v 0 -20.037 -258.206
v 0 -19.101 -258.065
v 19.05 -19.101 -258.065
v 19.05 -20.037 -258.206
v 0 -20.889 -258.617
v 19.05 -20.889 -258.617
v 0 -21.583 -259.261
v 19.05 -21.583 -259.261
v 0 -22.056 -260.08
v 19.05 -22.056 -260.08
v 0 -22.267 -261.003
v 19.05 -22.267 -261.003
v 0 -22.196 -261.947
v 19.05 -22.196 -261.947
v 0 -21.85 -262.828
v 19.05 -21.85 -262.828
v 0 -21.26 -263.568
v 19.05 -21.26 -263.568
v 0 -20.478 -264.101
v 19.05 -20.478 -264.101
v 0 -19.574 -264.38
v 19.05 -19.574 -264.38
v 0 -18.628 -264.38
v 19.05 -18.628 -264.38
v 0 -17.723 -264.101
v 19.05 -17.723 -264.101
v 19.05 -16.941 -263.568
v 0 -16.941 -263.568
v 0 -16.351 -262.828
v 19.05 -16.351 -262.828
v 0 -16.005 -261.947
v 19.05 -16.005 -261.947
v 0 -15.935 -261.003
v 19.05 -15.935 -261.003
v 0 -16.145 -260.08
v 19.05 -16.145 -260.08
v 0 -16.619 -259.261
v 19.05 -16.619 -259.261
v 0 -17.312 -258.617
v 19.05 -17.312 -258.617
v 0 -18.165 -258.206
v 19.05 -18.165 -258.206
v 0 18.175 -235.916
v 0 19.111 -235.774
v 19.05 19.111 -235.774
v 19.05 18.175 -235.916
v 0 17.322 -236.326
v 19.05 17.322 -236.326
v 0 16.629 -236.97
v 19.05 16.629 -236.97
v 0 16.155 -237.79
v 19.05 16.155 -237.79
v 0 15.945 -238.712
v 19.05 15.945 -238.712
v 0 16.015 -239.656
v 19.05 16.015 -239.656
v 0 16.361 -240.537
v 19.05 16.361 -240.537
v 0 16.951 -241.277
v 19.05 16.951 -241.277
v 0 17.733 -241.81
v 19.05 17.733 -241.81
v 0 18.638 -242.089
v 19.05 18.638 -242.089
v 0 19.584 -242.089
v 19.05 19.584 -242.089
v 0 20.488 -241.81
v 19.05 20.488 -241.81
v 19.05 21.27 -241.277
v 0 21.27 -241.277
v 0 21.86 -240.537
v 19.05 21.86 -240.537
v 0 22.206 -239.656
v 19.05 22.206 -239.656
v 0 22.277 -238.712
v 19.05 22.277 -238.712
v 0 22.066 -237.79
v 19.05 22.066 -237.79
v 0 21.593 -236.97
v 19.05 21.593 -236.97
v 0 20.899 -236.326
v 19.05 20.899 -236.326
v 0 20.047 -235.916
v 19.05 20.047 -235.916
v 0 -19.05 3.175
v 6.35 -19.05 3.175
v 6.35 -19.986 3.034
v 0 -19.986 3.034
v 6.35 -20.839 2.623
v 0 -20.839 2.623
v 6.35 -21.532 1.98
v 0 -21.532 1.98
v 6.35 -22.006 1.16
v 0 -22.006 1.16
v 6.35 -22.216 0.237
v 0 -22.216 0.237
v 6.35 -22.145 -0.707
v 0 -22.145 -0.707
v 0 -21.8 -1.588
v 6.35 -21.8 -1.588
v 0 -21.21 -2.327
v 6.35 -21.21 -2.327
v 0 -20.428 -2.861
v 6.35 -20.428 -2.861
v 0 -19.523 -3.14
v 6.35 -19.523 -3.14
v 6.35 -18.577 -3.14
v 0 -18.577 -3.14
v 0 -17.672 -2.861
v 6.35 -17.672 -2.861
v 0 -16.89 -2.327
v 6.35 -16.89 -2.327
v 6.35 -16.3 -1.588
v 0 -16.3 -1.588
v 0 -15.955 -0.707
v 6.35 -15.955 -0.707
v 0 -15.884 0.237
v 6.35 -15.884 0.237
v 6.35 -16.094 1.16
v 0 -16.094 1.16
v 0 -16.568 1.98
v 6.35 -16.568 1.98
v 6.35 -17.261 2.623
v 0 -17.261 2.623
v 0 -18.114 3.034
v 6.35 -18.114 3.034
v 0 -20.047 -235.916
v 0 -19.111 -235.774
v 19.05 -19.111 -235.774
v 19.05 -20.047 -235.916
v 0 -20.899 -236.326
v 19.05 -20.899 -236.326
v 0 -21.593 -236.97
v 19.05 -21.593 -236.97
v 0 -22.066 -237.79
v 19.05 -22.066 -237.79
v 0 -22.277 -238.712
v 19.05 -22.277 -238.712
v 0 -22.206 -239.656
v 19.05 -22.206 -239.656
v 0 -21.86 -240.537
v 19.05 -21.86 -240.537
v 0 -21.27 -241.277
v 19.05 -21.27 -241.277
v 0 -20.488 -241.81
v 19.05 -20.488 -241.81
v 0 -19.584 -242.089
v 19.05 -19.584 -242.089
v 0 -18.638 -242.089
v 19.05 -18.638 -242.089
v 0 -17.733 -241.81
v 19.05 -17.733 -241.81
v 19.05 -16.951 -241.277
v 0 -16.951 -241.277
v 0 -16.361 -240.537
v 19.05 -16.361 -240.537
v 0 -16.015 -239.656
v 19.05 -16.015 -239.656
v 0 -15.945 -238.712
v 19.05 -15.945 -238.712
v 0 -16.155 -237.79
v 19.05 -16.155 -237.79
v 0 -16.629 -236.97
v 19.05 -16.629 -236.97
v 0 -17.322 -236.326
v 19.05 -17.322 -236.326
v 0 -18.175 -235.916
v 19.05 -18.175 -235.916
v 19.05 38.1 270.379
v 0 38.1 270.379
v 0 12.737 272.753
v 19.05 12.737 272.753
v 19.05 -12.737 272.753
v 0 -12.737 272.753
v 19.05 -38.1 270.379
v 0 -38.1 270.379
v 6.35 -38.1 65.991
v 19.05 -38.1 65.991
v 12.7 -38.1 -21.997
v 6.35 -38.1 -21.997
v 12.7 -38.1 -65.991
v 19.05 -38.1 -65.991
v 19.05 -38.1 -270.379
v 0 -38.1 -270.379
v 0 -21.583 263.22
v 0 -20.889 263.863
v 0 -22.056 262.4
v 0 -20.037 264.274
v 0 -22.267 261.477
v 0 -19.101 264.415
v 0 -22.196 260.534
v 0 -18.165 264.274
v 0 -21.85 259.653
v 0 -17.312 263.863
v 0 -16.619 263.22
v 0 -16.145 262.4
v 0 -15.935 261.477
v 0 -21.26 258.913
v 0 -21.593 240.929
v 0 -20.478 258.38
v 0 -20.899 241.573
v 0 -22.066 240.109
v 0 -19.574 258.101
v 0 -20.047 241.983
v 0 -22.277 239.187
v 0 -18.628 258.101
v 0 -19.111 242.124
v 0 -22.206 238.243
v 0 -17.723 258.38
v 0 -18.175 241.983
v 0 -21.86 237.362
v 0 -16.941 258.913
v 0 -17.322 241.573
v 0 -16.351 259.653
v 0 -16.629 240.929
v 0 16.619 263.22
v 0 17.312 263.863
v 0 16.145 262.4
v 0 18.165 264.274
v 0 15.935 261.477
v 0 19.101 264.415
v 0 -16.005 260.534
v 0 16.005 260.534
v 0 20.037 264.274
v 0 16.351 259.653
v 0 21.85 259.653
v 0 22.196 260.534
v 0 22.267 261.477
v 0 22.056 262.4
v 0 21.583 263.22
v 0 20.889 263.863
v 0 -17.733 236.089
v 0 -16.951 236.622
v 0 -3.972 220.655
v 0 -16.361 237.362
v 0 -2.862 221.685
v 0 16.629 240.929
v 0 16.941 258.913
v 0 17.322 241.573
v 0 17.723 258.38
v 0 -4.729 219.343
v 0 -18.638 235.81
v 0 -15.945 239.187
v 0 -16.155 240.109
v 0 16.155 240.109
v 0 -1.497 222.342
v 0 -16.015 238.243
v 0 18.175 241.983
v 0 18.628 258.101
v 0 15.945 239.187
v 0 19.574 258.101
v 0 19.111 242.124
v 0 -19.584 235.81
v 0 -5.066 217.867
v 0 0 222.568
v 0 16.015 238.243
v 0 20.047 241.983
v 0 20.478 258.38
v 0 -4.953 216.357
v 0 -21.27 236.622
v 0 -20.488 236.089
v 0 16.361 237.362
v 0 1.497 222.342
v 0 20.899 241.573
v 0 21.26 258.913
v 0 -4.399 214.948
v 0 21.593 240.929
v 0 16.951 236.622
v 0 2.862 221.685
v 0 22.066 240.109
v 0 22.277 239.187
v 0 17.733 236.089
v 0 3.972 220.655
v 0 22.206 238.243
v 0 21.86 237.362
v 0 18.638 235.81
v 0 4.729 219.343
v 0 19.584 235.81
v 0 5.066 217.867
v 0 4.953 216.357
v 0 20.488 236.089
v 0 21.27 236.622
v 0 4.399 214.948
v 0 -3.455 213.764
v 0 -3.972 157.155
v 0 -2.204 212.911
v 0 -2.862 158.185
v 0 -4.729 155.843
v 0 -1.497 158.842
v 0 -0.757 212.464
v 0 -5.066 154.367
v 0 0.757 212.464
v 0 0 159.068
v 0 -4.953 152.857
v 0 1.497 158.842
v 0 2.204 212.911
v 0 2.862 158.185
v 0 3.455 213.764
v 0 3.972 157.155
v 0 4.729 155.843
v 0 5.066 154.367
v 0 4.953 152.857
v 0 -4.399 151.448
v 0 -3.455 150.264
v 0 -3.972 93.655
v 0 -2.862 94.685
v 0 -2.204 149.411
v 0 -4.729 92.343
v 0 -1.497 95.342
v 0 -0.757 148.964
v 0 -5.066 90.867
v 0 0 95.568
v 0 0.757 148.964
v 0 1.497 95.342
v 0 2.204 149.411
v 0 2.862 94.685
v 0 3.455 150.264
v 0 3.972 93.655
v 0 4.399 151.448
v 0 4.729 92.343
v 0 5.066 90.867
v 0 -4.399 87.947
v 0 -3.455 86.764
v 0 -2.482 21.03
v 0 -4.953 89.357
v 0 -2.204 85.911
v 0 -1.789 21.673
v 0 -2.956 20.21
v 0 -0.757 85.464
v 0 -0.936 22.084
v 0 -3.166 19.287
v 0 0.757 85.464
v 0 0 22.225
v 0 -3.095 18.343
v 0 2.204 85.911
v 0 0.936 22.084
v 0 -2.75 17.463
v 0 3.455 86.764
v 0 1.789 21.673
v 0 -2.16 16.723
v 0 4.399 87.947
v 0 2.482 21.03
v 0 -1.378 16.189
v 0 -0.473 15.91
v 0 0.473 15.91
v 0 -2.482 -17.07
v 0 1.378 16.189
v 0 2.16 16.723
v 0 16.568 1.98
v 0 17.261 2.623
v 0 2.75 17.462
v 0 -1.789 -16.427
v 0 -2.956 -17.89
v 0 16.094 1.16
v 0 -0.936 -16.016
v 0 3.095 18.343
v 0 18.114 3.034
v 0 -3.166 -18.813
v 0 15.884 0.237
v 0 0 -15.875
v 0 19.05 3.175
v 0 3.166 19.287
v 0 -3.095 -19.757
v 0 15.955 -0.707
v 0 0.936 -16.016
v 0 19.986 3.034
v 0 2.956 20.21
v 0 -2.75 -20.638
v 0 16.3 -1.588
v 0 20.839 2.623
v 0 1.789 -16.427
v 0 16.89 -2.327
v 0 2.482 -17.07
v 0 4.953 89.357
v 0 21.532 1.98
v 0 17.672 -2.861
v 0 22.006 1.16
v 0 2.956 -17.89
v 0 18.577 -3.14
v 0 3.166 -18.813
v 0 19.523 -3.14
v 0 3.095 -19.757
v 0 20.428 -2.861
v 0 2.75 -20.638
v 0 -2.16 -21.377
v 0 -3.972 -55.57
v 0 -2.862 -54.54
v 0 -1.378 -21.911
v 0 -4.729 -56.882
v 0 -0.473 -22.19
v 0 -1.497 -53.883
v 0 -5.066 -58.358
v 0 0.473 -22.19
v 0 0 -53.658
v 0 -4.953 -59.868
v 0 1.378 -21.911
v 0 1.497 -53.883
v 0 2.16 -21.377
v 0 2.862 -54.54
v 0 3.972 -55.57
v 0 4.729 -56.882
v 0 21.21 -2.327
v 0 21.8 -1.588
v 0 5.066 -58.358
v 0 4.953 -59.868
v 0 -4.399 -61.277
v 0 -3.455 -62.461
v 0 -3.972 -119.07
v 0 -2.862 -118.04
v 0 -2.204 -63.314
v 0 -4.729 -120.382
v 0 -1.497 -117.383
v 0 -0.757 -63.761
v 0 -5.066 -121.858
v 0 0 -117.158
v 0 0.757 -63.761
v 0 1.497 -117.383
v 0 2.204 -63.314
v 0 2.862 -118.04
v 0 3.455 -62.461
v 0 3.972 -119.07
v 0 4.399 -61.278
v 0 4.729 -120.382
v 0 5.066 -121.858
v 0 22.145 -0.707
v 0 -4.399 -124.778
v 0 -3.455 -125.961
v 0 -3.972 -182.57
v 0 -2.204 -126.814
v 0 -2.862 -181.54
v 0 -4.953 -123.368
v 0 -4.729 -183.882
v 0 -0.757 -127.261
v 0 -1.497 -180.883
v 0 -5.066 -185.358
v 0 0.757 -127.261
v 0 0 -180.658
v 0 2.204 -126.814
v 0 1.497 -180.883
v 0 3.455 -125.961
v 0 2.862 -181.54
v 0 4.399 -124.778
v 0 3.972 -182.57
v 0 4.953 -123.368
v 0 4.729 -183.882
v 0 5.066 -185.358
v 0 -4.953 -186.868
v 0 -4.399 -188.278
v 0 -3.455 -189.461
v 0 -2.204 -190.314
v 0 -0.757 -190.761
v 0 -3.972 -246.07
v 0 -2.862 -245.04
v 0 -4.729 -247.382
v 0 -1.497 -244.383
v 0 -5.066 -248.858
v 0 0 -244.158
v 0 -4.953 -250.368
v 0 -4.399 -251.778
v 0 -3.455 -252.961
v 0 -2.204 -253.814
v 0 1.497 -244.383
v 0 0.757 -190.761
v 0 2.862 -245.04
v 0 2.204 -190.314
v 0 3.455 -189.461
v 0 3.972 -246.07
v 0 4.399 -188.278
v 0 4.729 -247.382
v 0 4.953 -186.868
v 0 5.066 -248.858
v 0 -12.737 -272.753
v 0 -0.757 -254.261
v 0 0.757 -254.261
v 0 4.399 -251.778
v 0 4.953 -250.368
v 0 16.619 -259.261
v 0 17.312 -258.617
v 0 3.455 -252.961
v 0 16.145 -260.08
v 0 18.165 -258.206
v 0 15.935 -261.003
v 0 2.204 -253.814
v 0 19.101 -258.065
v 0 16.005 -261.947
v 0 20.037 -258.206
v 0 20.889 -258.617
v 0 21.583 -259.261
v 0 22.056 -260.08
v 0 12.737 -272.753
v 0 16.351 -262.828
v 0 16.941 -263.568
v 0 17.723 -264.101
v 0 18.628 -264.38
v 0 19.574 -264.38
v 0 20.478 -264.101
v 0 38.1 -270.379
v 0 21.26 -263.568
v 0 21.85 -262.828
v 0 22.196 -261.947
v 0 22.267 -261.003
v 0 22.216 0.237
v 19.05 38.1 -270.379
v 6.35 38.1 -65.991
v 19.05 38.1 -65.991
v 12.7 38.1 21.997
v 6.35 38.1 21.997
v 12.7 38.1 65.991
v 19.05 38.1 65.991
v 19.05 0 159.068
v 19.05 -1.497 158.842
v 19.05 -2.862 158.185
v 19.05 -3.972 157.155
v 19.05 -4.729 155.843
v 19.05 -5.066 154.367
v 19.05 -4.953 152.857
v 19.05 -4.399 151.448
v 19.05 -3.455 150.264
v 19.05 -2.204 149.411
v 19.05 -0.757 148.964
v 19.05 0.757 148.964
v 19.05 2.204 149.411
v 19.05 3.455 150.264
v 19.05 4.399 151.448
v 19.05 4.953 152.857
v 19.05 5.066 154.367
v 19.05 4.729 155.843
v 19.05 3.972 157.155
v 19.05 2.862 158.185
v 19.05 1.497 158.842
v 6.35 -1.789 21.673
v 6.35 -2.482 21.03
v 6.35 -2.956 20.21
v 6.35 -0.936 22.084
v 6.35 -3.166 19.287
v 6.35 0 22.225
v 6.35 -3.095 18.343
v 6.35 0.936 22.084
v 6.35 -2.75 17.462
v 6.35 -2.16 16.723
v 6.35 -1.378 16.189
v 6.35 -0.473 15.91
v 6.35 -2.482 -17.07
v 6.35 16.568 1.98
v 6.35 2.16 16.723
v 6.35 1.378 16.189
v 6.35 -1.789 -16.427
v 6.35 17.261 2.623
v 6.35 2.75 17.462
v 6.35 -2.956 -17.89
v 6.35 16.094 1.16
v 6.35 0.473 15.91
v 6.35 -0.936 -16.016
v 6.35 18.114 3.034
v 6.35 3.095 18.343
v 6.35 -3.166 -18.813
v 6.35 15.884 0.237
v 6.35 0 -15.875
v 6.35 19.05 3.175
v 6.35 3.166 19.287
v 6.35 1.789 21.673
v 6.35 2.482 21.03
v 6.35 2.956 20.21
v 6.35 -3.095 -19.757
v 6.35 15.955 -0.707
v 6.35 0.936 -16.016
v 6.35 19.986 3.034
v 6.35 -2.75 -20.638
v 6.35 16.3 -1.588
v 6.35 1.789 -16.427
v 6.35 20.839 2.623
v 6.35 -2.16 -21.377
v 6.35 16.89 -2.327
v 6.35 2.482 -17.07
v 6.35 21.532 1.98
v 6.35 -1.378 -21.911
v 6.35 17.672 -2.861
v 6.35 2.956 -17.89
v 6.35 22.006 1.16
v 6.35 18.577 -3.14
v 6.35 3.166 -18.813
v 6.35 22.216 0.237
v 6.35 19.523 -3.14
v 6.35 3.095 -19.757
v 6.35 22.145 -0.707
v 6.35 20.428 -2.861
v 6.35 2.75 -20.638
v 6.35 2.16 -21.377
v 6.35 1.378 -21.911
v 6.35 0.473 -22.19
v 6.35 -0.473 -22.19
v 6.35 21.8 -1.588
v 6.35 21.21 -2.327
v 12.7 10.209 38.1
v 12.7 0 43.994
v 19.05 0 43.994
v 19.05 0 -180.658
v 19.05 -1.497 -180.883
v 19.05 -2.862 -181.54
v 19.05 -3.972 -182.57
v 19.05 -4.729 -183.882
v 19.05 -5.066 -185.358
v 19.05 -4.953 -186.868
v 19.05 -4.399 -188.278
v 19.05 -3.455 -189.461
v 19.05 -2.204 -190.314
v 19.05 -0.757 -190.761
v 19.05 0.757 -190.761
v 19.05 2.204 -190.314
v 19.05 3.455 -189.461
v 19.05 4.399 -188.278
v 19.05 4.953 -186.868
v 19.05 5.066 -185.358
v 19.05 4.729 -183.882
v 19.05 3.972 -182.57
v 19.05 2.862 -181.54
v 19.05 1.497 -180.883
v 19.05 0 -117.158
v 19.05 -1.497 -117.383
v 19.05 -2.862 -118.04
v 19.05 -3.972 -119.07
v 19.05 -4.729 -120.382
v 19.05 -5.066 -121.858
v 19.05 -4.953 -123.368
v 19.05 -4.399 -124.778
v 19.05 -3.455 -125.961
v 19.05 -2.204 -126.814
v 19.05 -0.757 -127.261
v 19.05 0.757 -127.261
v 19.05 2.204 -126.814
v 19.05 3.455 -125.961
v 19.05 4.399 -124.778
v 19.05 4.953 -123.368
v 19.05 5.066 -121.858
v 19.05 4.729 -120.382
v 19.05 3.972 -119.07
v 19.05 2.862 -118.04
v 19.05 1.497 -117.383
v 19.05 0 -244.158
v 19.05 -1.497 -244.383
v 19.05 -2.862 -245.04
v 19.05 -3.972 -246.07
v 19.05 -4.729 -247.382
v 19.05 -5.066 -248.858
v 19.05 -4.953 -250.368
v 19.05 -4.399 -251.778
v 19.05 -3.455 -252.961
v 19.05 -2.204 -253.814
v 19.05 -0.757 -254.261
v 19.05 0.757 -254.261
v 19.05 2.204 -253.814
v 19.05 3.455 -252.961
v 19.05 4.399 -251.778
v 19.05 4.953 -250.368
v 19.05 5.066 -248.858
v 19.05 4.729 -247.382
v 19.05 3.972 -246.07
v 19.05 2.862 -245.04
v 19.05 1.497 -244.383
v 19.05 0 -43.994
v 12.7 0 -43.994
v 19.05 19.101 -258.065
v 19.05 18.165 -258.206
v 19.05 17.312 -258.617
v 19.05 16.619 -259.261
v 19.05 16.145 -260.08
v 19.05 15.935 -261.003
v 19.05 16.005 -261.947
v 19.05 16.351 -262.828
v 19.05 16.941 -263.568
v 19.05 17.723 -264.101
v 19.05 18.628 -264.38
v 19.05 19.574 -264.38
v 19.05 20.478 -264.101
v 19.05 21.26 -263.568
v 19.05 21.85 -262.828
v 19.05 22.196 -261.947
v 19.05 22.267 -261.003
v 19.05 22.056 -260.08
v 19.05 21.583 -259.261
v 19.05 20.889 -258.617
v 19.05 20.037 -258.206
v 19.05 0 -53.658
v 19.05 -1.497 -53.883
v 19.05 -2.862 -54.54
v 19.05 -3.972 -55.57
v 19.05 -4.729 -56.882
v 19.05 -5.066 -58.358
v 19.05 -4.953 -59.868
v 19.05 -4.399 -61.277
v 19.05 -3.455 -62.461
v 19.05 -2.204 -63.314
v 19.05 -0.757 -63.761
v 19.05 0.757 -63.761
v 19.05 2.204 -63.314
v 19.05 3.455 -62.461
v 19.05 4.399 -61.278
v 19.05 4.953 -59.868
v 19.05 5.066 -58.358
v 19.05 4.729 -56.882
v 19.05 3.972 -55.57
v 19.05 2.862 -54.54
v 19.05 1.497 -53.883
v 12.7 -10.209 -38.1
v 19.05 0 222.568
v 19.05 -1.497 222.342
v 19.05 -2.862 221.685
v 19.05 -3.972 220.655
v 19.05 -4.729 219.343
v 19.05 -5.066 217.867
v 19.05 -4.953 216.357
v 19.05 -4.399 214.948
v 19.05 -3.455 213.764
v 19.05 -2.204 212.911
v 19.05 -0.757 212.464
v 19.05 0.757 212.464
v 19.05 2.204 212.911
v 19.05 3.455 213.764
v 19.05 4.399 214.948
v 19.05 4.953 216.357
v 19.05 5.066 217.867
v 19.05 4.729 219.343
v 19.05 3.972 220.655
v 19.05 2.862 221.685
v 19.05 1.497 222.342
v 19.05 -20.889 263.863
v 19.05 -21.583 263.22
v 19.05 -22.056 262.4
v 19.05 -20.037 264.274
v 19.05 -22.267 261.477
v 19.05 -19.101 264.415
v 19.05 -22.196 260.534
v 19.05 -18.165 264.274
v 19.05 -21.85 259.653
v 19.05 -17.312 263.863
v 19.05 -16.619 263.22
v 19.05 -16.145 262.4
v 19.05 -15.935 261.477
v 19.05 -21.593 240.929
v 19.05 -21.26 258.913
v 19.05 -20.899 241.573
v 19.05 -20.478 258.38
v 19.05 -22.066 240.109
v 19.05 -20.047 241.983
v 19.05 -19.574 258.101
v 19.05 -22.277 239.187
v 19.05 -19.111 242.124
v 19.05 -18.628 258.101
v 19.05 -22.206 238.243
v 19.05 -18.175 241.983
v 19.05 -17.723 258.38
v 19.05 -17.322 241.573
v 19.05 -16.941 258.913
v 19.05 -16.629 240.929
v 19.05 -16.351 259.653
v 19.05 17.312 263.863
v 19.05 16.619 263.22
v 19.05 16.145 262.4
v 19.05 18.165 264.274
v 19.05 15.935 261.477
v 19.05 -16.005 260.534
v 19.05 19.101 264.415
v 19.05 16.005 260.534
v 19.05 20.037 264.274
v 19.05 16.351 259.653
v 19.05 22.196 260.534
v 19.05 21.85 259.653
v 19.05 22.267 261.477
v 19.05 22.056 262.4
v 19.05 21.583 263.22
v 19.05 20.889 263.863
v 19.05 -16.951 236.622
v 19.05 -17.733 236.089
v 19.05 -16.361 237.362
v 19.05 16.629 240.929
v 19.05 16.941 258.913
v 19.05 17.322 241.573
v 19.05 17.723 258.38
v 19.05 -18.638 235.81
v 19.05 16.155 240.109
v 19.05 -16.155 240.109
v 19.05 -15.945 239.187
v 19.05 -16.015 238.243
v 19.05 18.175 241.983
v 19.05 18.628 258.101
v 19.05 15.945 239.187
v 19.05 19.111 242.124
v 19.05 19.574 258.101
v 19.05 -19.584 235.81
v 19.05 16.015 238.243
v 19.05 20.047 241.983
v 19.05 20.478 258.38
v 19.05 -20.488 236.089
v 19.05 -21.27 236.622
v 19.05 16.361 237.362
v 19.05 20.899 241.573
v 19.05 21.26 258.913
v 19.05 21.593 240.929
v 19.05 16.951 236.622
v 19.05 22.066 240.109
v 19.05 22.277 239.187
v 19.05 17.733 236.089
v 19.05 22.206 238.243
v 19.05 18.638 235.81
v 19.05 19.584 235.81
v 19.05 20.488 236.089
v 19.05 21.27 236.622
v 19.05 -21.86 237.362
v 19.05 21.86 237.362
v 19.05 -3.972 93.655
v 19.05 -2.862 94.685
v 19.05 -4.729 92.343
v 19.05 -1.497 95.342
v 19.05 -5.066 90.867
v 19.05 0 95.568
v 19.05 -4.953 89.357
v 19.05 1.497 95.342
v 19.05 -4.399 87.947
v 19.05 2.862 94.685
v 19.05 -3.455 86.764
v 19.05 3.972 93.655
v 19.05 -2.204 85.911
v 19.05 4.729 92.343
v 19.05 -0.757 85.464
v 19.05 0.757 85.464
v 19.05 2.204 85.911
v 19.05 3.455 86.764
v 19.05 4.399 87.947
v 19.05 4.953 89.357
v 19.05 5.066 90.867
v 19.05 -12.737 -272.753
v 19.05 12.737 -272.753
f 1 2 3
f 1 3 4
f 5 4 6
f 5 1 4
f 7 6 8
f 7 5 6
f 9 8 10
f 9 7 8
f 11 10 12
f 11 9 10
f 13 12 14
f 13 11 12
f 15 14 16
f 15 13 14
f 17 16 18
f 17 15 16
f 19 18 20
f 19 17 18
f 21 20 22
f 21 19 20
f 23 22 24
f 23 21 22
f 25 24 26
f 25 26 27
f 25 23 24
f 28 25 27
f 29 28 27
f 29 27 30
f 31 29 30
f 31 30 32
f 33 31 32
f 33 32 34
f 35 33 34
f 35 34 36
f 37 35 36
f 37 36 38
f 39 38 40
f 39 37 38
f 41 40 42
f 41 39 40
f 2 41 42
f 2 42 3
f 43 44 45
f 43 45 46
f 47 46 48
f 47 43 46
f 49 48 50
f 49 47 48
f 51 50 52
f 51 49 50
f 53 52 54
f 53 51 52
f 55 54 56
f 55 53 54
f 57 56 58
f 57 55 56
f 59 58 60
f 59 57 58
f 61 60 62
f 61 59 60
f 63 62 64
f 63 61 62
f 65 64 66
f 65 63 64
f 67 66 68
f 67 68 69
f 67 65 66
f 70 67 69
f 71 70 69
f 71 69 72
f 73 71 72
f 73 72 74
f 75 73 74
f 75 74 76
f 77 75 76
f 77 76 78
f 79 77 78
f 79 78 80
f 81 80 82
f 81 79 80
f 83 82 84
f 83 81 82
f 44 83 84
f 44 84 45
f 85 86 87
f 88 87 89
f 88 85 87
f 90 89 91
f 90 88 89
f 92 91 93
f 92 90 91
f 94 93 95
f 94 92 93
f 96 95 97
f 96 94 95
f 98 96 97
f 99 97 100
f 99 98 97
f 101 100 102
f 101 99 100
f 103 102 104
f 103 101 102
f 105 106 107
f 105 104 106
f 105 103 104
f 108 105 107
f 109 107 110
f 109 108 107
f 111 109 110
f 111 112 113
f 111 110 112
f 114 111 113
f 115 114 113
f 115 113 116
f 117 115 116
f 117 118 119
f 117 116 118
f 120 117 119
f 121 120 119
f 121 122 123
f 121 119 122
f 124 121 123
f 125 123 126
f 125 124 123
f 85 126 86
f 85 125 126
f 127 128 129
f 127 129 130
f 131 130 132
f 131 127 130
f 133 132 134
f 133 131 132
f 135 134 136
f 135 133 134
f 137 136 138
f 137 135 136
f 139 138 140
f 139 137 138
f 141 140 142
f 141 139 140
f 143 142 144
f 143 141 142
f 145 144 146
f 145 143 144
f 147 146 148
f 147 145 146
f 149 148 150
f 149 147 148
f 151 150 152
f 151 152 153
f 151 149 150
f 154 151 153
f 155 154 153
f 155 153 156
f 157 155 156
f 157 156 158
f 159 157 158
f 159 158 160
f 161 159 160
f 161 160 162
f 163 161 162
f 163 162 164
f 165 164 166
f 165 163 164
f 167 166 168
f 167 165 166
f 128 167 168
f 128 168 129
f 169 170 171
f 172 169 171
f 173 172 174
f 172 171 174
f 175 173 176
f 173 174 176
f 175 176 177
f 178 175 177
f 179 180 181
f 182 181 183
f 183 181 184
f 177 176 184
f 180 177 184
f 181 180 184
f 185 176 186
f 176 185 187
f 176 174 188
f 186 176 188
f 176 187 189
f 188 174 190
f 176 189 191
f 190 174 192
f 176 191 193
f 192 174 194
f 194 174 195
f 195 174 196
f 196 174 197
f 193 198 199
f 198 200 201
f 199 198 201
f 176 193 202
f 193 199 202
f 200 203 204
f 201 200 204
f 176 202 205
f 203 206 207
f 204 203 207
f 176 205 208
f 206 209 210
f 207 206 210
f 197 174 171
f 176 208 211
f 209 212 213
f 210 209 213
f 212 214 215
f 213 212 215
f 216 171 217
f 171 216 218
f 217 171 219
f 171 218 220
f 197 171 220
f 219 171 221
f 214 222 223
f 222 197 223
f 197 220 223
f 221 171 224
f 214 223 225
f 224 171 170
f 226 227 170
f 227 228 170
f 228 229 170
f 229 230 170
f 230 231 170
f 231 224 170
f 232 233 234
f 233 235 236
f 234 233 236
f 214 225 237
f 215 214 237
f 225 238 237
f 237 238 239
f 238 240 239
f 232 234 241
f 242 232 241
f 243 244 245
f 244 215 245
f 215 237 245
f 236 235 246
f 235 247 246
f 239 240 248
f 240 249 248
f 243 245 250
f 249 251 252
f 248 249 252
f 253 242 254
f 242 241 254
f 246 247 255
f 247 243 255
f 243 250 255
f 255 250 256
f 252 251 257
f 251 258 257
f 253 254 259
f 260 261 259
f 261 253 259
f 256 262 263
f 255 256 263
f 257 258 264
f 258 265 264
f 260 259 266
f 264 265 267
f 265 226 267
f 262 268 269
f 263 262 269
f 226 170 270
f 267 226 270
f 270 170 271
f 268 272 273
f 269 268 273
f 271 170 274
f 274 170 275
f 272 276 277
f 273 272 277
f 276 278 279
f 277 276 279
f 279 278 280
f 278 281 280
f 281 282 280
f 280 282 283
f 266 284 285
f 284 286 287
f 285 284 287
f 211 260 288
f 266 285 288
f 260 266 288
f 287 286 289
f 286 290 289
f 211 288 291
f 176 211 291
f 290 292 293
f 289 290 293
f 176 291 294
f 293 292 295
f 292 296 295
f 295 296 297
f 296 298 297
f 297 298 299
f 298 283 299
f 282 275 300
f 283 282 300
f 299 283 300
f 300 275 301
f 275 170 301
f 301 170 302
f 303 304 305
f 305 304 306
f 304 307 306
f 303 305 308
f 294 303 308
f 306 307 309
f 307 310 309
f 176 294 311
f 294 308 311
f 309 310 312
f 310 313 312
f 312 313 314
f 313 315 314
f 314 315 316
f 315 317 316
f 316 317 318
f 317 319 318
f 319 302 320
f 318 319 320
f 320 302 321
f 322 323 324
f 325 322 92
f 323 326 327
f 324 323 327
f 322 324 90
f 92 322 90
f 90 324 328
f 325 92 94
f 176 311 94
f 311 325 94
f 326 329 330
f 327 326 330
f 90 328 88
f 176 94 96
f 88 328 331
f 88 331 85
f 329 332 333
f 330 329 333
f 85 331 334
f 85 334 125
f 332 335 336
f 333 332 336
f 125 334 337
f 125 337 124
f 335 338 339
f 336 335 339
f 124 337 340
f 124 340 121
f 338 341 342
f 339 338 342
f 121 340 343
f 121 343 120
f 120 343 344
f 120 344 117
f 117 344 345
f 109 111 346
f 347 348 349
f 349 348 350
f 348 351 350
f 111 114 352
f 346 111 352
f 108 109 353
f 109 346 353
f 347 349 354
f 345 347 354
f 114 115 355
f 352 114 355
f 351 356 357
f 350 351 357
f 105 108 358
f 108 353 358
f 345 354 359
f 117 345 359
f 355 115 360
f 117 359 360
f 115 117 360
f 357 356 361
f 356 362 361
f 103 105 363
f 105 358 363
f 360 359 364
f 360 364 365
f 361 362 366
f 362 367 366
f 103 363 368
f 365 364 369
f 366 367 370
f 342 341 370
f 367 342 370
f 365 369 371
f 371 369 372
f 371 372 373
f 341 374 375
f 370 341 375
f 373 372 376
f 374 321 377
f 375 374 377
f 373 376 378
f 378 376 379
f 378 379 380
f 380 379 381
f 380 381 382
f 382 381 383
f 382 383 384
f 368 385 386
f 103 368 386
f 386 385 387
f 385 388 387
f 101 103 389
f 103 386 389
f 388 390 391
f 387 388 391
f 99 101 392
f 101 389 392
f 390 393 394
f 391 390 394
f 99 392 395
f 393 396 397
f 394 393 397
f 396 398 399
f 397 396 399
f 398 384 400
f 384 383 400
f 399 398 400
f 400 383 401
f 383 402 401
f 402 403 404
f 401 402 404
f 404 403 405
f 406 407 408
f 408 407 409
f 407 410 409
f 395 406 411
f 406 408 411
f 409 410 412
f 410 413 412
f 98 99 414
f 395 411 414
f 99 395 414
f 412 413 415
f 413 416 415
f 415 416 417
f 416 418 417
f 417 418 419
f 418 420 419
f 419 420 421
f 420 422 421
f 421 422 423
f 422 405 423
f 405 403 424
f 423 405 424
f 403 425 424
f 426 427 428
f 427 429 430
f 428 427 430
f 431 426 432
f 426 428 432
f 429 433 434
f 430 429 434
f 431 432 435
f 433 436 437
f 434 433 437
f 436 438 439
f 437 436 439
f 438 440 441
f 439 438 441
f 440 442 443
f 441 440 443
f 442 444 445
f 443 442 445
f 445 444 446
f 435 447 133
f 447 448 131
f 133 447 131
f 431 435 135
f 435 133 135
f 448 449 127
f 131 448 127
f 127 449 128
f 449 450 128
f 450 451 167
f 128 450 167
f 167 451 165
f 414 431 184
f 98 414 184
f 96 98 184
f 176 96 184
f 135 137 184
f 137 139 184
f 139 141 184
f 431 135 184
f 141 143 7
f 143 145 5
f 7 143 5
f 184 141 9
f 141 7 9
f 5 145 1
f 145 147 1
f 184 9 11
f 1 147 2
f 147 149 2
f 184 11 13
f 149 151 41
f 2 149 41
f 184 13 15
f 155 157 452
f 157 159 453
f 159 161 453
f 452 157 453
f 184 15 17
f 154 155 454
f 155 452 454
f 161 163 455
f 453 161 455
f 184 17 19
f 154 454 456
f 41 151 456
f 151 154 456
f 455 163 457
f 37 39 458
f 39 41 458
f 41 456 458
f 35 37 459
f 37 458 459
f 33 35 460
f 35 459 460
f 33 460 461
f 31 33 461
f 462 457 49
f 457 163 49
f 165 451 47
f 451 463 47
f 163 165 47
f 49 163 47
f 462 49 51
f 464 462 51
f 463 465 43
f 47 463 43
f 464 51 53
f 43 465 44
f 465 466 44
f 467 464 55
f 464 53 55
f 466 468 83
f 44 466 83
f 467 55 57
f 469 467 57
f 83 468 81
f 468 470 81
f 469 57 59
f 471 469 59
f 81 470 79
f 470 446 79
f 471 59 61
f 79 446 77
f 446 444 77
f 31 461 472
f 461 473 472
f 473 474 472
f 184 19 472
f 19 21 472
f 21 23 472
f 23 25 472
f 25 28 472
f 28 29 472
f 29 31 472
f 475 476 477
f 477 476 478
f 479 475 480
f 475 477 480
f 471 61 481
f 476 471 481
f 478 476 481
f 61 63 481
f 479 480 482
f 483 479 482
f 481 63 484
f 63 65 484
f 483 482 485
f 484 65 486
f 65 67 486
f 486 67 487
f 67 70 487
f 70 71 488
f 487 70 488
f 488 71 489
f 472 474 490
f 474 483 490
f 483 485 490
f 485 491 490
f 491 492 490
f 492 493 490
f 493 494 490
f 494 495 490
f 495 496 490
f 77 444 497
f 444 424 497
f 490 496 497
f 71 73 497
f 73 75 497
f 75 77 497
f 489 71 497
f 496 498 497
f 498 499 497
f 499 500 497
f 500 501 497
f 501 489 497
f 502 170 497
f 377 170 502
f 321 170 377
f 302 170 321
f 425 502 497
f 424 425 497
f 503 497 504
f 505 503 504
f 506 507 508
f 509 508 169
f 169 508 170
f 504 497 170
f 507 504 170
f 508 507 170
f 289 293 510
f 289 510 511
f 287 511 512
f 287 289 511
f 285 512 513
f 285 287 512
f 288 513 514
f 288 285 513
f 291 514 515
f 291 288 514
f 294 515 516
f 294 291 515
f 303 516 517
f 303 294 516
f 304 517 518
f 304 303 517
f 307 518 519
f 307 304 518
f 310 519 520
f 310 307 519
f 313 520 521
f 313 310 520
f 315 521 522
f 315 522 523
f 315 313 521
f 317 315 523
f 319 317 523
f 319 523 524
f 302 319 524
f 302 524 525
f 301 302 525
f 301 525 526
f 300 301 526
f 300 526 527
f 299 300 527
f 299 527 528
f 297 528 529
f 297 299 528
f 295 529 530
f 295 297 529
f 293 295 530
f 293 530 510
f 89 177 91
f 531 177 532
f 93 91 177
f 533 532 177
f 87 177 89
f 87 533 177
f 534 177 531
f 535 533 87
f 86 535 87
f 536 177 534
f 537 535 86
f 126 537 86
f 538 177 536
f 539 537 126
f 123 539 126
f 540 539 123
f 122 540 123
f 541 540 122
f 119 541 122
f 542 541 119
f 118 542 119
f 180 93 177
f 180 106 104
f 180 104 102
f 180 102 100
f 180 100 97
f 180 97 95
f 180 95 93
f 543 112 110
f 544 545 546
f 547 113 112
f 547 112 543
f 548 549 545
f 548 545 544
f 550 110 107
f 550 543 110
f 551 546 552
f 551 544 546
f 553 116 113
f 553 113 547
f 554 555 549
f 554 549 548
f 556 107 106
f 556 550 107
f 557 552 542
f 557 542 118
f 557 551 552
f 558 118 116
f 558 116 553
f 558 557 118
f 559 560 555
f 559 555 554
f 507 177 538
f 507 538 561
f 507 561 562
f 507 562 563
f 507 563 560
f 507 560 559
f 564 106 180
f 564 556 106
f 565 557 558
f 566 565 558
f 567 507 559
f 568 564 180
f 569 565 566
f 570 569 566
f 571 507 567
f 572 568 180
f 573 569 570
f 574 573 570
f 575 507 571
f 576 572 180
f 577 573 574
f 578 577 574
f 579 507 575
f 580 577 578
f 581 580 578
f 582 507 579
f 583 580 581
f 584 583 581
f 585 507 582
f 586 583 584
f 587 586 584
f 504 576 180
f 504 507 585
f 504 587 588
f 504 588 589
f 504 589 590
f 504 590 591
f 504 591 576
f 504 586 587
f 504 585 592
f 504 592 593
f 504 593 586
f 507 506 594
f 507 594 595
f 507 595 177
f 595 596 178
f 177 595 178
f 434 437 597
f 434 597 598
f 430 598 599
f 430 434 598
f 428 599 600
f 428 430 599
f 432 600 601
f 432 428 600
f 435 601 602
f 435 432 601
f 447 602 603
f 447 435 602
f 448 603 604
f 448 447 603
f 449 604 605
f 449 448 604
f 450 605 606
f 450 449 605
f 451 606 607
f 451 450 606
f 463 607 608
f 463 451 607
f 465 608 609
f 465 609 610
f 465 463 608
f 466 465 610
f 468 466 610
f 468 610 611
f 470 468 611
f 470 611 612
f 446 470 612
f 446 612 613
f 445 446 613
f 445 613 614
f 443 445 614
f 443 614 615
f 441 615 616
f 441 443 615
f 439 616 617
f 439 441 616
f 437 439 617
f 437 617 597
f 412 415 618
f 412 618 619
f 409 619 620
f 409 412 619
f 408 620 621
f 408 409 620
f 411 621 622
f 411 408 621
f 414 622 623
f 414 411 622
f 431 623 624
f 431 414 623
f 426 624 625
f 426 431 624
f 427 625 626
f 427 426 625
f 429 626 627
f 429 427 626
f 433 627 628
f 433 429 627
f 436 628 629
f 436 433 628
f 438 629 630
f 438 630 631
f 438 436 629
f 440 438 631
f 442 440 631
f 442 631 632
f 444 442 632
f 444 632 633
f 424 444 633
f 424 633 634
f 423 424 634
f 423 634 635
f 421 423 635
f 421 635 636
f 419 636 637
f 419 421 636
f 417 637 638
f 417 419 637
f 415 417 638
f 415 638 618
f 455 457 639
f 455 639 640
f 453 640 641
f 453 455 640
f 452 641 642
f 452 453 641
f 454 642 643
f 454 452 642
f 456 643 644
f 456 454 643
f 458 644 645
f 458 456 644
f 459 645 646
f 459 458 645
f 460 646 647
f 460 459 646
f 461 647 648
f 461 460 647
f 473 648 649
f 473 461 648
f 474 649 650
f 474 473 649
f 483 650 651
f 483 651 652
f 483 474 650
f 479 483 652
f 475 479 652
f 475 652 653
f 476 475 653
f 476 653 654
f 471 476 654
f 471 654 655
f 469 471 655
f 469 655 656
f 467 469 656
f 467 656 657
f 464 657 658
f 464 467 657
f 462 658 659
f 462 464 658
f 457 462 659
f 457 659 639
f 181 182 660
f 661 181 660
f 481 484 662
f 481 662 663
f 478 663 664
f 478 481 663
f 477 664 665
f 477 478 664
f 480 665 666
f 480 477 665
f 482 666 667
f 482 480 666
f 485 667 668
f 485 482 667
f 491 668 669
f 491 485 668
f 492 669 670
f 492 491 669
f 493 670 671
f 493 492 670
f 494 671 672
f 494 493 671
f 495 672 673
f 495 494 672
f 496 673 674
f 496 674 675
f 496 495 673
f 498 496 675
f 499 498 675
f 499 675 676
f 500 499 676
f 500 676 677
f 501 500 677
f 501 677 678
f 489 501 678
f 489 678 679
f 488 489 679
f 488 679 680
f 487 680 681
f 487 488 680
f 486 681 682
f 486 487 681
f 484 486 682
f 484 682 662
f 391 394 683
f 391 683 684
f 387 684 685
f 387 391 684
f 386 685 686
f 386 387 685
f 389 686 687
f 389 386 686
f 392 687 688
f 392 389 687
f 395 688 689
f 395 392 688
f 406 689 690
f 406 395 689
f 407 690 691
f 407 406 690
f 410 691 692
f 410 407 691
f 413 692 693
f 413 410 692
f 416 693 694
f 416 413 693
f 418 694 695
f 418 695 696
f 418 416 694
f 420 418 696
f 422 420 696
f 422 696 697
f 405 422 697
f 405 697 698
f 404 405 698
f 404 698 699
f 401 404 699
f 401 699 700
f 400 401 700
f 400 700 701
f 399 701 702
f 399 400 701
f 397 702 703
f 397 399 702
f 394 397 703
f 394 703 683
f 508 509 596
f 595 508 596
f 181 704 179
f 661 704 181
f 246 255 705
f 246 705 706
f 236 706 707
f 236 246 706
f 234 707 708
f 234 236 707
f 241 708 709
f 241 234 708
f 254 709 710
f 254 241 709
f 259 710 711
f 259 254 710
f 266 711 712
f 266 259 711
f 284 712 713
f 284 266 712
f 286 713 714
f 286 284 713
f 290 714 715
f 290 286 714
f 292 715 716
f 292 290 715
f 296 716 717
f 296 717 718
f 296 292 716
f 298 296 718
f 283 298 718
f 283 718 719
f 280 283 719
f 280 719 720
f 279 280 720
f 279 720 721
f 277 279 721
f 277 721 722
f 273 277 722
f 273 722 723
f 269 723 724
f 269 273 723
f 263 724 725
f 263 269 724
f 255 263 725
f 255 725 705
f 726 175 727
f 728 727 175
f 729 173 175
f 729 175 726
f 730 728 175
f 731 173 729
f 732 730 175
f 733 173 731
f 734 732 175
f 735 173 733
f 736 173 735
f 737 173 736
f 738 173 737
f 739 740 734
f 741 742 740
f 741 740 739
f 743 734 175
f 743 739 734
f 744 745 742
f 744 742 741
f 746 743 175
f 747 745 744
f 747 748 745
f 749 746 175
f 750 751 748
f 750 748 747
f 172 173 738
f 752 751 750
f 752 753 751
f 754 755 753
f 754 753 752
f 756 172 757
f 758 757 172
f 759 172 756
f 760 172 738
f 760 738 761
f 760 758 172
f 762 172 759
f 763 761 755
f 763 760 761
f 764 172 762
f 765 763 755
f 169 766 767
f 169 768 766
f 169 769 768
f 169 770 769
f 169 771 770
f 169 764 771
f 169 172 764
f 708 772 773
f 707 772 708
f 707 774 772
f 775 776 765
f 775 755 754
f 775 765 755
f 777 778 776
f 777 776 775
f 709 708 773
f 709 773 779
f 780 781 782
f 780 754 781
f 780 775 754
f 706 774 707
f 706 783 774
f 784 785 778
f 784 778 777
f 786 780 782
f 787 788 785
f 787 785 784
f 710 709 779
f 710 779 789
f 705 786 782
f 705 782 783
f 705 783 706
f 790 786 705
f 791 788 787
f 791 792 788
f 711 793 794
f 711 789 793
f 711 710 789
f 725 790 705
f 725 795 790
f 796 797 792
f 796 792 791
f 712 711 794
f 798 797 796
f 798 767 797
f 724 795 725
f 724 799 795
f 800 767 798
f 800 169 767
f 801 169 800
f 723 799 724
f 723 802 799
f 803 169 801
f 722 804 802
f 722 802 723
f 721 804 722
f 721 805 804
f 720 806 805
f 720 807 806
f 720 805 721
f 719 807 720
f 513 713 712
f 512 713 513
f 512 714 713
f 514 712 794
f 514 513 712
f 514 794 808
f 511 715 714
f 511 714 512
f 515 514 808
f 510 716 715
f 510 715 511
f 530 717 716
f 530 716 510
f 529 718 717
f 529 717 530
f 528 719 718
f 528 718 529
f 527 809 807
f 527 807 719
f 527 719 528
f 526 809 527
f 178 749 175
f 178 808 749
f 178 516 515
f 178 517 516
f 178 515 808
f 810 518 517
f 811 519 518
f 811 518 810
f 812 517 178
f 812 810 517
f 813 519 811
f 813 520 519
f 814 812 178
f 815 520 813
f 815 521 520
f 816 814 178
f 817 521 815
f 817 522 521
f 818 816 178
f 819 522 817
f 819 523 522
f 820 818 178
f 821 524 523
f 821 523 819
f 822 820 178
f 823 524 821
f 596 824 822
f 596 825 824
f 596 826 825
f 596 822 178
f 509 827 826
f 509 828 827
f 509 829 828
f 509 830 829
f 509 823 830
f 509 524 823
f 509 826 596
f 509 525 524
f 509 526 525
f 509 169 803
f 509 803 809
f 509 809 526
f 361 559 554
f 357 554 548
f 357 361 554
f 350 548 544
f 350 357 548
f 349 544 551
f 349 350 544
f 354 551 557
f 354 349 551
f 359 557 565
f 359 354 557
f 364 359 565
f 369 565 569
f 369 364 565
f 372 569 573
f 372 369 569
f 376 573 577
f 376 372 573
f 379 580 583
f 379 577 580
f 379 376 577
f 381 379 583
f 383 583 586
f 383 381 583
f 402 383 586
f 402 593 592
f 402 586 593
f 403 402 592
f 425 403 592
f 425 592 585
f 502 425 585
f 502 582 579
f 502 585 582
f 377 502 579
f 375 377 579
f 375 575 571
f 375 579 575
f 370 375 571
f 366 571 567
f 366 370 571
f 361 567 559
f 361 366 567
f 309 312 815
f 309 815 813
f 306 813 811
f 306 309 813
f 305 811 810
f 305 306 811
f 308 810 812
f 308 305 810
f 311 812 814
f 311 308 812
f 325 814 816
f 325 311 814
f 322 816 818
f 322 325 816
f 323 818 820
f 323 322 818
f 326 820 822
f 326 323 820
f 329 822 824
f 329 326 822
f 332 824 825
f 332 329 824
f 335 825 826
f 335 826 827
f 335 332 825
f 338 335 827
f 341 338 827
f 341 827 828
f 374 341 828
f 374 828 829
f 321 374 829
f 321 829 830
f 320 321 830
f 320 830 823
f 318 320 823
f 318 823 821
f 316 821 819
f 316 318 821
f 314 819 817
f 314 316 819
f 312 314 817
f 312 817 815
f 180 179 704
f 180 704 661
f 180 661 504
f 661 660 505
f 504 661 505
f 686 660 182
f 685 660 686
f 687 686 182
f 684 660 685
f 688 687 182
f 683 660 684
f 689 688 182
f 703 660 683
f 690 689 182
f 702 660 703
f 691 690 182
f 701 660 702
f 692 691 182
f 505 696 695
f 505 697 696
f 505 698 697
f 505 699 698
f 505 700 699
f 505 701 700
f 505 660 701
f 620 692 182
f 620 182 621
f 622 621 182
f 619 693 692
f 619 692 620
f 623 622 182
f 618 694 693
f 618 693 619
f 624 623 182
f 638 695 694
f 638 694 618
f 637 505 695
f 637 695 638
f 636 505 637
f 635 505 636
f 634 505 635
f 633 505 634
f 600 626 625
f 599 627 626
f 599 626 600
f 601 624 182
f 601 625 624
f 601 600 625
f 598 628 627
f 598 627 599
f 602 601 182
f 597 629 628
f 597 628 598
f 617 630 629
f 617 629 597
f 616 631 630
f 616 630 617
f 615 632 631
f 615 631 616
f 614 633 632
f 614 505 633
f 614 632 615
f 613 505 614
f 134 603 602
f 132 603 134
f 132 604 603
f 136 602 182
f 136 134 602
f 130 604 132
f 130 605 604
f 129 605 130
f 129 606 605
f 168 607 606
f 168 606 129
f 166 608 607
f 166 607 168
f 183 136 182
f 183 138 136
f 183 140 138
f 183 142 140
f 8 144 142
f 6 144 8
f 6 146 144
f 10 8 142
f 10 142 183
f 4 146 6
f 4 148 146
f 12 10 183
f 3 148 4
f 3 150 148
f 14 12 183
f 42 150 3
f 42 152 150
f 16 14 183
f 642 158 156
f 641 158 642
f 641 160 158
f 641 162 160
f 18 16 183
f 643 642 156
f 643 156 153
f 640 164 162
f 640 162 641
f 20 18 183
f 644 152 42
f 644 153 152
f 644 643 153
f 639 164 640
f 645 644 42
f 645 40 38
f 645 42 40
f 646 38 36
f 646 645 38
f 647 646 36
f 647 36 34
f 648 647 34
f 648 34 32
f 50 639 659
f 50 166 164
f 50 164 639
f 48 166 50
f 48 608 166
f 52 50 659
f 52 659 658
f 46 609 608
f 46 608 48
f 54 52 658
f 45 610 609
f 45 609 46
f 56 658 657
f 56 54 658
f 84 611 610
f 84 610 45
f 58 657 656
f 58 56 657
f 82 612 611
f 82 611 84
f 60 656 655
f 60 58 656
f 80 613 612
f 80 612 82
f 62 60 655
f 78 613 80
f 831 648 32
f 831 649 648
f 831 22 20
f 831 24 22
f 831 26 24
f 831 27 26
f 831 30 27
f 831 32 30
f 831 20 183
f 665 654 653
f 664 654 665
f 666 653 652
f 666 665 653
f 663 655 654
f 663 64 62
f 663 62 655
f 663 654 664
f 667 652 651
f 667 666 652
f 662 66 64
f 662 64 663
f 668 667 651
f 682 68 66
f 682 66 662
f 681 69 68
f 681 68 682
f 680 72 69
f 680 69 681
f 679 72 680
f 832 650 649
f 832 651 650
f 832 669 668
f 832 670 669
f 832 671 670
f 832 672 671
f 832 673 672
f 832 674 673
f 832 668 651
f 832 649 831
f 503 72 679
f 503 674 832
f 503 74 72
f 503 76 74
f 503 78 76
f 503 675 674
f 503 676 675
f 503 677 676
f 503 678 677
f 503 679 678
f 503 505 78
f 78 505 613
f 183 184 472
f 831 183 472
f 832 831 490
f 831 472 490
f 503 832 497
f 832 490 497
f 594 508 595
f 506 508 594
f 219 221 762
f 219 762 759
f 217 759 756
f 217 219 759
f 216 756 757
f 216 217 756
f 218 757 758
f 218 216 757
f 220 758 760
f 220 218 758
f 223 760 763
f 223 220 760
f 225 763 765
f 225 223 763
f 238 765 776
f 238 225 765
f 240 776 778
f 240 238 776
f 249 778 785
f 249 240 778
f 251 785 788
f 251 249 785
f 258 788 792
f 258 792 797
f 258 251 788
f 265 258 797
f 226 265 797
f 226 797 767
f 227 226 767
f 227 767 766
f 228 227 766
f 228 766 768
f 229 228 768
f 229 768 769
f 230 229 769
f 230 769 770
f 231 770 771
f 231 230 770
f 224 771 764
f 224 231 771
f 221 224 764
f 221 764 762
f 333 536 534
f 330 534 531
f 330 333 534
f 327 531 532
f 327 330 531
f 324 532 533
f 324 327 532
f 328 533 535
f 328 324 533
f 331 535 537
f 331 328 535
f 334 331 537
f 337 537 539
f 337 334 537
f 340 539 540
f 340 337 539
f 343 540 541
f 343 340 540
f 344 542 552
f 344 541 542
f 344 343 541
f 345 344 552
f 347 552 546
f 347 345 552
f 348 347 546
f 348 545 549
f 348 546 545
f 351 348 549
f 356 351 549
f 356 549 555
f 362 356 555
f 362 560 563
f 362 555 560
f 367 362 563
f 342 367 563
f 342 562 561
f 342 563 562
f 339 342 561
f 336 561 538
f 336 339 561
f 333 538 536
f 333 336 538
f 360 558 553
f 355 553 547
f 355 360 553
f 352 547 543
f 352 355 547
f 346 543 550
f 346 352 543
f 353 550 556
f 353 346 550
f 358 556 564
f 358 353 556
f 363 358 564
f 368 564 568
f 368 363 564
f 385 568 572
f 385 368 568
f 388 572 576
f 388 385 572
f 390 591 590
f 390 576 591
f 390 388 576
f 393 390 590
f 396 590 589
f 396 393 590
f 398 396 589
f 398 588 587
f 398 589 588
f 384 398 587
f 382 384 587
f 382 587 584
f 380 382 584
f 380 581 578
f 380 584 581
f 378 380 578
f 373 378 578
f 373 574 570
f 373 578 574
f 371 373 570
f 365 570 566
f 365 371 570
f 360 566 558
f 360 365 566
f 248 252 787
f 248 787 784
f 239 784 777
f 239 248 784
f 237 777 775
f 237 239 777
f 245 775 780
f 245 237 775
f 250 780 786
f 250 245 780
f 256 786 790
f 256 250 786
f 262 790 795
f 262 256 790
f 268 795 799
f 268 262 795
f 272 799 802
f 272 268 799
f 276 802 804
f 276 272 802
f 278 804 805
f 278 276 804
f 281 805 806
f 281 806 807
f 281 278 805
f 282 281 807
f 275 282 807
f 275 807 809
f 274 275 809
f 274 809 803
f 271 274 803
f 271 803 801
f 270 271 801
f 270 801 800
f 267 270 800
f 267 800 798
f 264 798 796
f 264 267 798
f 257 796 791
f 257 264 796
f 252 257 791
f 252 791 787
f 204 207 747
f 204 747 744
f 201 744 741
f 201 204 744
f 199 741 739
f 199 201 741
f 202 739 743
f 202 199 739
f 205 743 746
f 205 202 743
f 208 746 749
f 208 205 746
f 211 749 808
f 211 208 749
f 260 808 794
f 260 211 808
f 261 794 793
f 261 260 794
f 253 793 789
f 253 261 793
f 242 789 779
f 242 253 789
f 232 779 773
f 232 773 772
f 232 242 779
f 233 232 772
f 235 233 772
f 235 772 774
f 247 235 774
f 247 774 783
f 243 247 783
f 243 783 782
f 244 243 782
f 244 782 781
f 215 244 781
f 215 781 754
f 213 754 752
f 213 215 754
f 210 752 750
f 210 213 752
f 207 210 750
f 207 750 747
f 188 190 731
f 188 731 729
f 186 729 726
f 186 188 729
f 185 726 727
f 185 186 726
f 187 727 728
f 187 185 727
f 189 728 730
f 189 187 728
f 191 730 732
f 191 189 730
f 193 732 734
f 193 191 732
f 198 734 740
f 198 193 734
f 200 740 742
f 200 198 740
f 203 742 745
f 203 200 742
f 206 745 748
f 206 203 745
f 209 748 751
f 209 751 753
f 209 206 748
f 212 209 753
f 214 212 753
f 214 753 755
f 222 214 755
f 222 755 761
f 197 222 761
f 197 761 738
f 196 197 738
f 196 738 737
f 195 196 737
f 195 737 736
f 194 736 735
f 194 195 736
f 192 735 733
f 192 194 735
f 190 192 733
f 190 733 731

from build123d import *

# Parameters (mm, degrees)
SKETCH2_R           = 3.175
SKETCH2_R_2         = 5.08
BOSS_EXTRUDE1_DEPTH = 19.05
CUT_EXTRUDE1_START  = -12.7
SKETCH3_R           = 3.175
CUT_EXTRUDE1_DEPTH  = 12.7
CUT_EXTRUDE2_DEPTH  = 6.35


with BuildPart() as part:
    # Sketch2 → Boss-Extrude1 (new body)
    with BuildSketch(Plane(origin=(0, 0, 0), x_dir=(0, 0, -1), z_dir=(1, 0, 0))):
        with BuildLine():
            Line((38.1, 38.1), (-270.378794472, 38.1))
            ThreePointArc((-270.378794472, 38.1), (-273.05, 0), (-270.378794472, -38.1))
            Line((-270.378794472, -38.1), (270.378794472, -38.1))
            ThreePointArc((270.378794472, -38.1), (273.05, 0), (270.378794472, 38.1))
            Line((270.378794472, 38.1), (38.1, 38.1))
        make_face()
        with Locations((19.05, 0)):
            Circle(SKETCH2_R, mode=Mode.SUBTRACT)
        with Locations((0, -19.05)):
            Circle(SKETCH2_R, mode=Mode.SUBTRACT)
        with Locations((-19.05, 0)):
            Circle(SKETCH2_R, mode=Mode.SUBTRACT)
        with Locations((0, 19.05)):
            Circle(SKETCH2_R, mode=Mode.SUBTRACT)
        with Locations((-90.4875, 0)):
            Circle(SKETCH2_R_2, mode=Mode.SUBTRACT)
        with Locations((-217.4875, 0)):
            Circle(SKETCH2_R_2, mode=Mode.SUBTRACT)
        with Locations((-153.9875, 0)):
            Circle(SKETCH2_R_2, mode=Mode.SUBTRACT)
        with Locations((185.7375, 0)):
            Circle(SKETCH2_R_2, mode=Mode.SUBTRACT)
        with Locations((58.7375, 0)):
            Circle(SKETCH2_R_2, mode=Mode.SUBTRACT)
        with Locations((122.2375, 0)):
            Circle(SKETCH2_R_2, mode=Mode.SUBTRACT)
        with Locations((-238.949490115, 19.110830171)):
            Circle(SKETCH2_R, mode=Mode.SUBTRACT)
        with Locations((-261.240141142, -19.100852393)):
            Circle(SKETCH2_R, mode=Mode.SUBTRACT)
        with Locations((-238.949490115, -19.110830171)):
            Circle(SKETCH2_R, mode=Mode.SUBTRACT)
        with Locations((-261.240141142, 19.100852393)):
            Circle(SKETCH2_R, mode=Mode.SUBTRACT)
        with Locations((261.240141142, 19.100852393)):
            Circle(SKETCH2_R, mode=Mode.SUBTRACT)
        with Locations((238.949490115, 19.110830171)):
            Circle(SKETCH2_R, mode=Mode.SUBTRACT)
        with Locations((249.2375, 0)):
            Circle(SKETCH2_R_2, mode=Mode.SUBTRACT)
        with Locations((238.949490115, -19.110830171)):
            Circle(SKETCH2_R, mode=Mode.SUBTRACT)
        with Locations((261.240141142, -19.100852393)):
            Circle(SKETCH2_R, mode=Mode.SUBTRACT)
    extrude(amount=BOSS_EXTRUDE1_DEPTH)

    # Sketch3 → Cut-Extrude1 (cut)
    with BuildSketch(Plane(origin=(19.05, 0, 0), x_dir=(0, 0, -1), z_dir=(1, 0, 0)).offset(CUT_EXTRUDE1_START)):
        Polygon((21.997045256, -38.1), (65.991135768, 38.1), (-21.997045256, 38.1), (-65.991135768, -38.1), align=None)
        with Locations((-19.05, 0)):
            Circle(SKETCH3_R, mode=Mode.SUBTRACT)
        with Locations((0, -19.05)):
            Circle(SKETCH3_R, mode=Mode.SUBTRACT)
        with Locations((19.05, 0)):
            Circle(SKETCH3_R, mode=Mode.SUBTRACT)
        with Locations((0, 19.05)):
            Circle(SKETCH3_R, mode=Mode.SUBTRACT)
    extrude(amount=CUT_EXTRUDE1_DEPTH, mode=Mode.SUBTRACT)

    # Sketch3<3> → Cut-Extrude2 (cut)
    with BuildSketch(Plane(origin=(19.05, 0, 0), x_dir=(0, 0, -1), z_dir=(1, 0, 0))):
        Polygon((21.997045256, -38.1), (65.991135768, -38.1), (43.994090512, 0), align=None)
        Polygon((-43.994090512, 0), (-21.997045256, 38.1), (-65.991135768, 38.1), align=None)
    extrude(amount=-CUT_EXTRUDE2_DEPTH, mode=Mode.SUBTRACT)


solid = part.part
